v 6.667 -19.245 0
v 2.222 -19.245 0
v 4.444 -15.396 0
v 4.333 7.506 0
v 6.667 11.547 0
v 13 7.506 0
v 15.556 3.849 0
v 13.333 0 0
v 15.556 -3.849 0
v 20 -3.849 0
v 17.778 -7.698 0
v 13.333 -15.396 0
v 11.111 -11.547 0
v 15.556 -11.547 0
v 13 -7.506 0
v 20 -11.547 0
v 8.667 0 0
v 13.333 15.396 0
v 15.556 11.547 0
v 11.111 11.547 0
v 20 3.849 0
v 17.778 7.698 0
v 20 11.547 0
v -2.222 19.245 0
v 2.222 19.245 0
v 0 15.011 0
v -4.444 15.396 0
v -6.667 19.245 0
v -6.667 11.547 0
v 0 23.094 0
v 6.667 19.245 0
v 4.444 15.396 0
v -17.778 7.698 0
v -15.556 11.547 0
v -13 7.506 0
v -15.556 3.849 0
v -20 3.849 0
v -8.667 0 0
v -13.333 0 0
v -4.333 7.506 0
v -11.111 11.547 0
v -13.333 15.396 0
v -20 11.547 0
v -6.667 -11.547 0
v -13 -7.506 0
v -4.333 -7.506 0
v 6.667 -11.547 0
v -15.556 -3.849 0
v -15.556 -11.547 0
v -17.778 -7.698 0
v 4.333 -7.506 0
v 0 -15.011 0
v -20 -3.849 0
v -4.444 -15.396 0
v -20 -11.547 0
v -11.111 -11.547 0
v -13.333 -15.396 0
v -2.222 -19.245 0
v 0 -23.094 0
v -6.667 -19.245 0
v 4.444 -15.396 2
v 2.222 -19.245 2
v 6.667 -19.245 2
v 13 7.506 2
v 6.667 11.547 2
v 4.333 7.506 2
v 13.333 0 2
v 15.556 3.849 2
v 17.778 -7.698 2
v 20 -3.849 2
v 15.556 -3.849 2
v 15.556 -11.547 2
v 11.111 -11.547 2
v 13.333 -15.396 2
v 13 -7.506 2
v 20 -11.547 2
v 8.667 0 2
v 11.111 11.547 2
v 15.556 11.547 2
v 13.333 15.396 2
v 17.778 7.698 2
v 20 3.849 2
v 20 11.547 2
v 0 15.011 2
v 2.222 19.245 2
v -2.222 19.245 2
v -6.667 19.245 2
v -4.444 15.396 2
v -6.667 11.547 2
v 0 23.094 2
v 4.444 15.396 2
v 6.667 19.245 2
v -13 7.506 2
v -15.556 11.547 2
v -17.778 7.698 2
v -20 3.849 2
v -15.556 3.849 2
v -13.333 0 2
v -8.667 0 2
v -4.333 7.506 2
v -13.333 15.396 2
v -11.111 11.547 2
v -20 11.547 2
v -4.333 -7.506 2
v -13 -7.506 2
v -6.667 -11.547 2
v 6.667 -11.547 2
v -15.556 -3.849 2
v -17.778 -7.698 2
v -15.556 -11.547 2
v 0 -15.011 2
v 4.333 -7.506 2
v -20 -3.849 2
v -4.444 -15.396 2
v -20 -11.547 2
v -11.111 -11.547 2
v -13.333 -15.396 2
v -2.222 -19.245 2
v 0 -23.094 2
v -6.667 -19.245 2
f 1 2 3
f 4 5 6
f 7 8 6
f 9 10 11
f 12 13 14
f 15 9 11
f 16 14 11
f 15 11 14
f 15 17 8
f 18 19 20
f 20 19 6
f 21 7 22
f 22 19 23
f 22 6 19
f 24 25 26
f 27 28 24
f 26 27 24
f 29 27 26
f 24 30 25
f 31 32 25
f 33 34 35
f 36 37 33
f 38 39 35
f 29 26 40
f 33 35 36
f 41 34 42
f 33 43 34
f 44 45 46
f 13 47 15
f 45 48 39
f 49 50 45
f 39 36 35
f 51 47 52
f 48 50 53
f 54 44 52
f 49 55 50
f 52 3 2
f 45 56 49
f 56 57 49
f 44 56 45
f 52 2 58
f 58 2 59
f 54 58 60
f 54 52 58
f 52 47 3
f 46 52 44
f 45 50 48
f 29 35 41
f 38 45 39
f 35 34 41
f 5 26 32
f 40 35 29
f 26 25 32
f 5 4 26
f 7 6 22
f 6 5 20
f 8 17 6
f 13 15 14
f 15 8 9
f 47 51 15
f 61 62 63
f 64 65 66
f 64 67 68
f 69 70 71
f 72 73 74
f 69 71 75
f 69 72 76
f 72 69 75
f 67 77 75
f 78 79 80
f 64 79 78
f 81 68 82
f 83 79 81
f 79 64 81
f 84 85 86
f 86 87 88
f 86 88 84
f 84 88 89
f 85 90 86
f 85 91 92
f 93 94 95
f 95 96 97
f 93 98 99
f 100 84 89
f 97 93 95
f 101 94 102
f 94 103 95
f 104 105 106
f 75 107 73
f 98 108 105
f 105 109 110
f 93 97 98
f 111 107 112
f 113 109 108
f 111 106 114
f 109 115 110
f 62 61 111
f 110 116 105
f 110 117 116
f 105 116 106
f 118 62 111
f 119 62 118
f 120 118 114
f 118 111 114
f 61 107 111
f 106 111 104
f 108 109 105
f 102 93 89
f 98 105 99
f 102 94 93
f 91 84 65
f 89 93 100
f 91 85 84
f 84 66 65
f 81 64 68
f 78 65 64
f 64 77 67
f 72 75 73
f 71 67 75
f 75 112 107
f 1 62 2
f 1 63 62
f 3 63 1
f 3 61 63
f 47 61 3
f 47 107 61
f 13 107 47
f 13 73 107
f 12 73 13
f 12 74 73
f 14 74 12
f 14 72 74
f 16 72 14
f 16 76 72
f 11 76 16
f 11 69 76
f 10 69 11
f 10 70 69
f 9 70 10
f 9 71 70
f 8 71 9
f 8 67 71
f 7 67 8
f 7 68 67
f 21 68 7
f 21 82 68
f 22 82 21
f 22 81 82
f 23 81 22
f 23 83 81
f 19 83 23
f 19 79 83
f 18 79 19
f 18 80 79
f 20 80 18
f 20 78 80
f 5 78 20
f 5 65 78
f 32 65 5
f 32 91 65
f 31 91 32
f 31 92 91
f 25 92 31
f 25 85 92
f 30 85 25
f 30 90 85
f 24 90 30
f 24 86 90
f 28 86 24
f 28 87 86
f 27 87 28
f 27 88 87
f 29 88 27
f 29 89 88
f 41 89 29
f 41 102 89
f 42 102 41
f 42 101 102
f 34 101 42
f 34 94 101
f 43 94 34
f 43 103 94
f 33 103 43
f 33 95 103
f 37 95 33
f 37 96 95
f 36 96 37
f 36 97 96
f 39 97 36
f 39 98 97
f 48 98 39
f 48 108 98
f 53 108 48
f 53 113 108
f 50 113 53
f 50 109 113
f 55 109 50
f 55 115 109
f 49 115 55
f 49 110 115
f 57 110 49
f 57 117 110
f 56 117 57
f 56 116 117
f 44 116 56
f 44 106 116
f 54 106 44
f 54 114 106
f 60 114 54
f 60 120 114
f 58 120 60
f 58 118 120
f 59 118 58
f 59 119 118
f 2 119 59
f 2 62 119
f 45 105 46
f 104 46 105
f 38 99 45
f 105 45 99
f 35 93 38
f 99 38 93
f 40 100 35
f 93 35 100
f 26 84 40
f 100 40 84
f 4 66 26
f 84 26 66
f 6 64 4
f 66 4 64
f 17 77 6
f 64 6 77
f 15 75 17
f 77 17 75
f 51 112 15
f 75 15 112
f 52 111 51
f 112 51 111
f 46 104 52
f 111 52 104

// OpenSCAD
/*
 Koch snowflakes 
 
 only up to order 4 since recursion breaks at higher orders
 higher orders are not practical for making anyway , even 4 probably isnt (768 sides)
 
 kitwallace Mar 2019
*/
// side length of base triangle
side=40;
// order of outer koch snowflake 0 to 4 
outer_order=2;
// reduction in scale of inner snowflake
reduce=0.65;
// order of inner snowflake  0 to 4 
inner_order=1;
// extrude height 0 = no extrusion for laser cutting
height=2;

function koch_peri(peri,sides,n,i=0) =
  i<n 
    ? koch_peri(replace_sides(peri,sides),sides,n,i+1)
    : peri ;
    
module outline(outer,inner) {
    difference() {
         fill_tile(centre_tile(peri_to_tile(outer)));
         fill_tile(centre_tile(peri_to_tile(inner)));
    }
}  
     
koch_side = norm_peri([240,60,240,60]);
triangle = repeat_peri([[side,60]],3);
koch_outer= koch_peri(triangle,[koch_side],outer_order);
koch_inner= scale_peri(koch_peri(triangle,[koch_side],inner_order),reduce);
if (height > 0)
    linear_extrude(height=height)
      outline(koch_outer,koch_inner);
else 
    outline(koch_outer,koch_inner);
    
// extracts from tiling library
         
module fill_tile(tile,col="red") {
    color(col)
       polygon(3d_to_2d(tile)); 
};
         
 // functions
 
function replace_sides(peri,sides) =
 flatten( [for (i=[0:len(peri)-1])
      let (bside = peri[i])
      let (mside =  sides[i % len(sides)])
      let (mside_m = 
              len(mside) >1 
                 ? concat([for (i=[0:len(mside)-2]) mside[i]],[[mside[len(mside)-1][0],bside[1]]])
                 : [[mside[0][0],bside[1]]]
           )
      let (mside_length = peri_error(mside_m))
      let (mside_scaled = scale_peri(mside_m,bside[0]/mside_length))
      mside_scaled
  ]);

function peri_to_points(peri,pos=[0,0,0],dir=0,i=0) =
    i == len(peri)
      ? [pos]
      : let (side = peri[i])
        let (distance = side[0])
        let (newpos = pos + distance* [cos(dir), sin(dir),0])
        let (angle = side[1])
        let (newdir = dir + (180 - angle))
        concat([pos],peri_to_points(peri,newpos,newdir,i+1)) 
     ;                 

function peri_to_tile(peri,last=false) = 
    let (p = peri_to_points(norm_peri(peri)))  
    last 
       ? [for (i=[0:len(p)-1]) p[i]] 
       : [for (i=[0:len(p)-2]) p[i]]; 

function norm_peri(peri) =
     [for (p=peri)
        len(p)==undef
           ? [1,p]
           :[p.x,p.y] 
     ];
function repeat_peri(p,n) =
   norm_peri( flatten([for (i=[0:n-1]) p]));
    
function scale_peri(peri,scale) =
   [for (p=peri)
        len(p)==undef
           ? [scale,p]
           :[scale * p[0],p[1]] 
   ];
   
function peri_error(peri) = 
    norm(peri_end(peri));

function peri_end(peri) =
    let(t=peri_to_tile(peri,true))
    t[len(t)-1];    
  
function translate_tile(t,d) =
      [for (p=t) p+d]; 
        
function centre_tile(t) =
    let(c = v_avg(t))
    translate_tile(t,-c);

function 3d_to_2d(points)=
    [ for (p=points) [p.x,p.y]];
function v_avg(v) =v_sum(v) / len(v);
      
function zero(v) =
    len(v) == undef ? 0 : [for (i=[0:len(v)-1]) 0];
        
function v_sum_r(v,n,k) =
      k < n ?  v[k] + v_sum_r(v,n,k+1) : zero(v[0]) ;

function v_sum(v) = v_sum_r(v,len(v),0);
      
function flatten(l) = [ for (a = l) for (b = a) b ] ;
